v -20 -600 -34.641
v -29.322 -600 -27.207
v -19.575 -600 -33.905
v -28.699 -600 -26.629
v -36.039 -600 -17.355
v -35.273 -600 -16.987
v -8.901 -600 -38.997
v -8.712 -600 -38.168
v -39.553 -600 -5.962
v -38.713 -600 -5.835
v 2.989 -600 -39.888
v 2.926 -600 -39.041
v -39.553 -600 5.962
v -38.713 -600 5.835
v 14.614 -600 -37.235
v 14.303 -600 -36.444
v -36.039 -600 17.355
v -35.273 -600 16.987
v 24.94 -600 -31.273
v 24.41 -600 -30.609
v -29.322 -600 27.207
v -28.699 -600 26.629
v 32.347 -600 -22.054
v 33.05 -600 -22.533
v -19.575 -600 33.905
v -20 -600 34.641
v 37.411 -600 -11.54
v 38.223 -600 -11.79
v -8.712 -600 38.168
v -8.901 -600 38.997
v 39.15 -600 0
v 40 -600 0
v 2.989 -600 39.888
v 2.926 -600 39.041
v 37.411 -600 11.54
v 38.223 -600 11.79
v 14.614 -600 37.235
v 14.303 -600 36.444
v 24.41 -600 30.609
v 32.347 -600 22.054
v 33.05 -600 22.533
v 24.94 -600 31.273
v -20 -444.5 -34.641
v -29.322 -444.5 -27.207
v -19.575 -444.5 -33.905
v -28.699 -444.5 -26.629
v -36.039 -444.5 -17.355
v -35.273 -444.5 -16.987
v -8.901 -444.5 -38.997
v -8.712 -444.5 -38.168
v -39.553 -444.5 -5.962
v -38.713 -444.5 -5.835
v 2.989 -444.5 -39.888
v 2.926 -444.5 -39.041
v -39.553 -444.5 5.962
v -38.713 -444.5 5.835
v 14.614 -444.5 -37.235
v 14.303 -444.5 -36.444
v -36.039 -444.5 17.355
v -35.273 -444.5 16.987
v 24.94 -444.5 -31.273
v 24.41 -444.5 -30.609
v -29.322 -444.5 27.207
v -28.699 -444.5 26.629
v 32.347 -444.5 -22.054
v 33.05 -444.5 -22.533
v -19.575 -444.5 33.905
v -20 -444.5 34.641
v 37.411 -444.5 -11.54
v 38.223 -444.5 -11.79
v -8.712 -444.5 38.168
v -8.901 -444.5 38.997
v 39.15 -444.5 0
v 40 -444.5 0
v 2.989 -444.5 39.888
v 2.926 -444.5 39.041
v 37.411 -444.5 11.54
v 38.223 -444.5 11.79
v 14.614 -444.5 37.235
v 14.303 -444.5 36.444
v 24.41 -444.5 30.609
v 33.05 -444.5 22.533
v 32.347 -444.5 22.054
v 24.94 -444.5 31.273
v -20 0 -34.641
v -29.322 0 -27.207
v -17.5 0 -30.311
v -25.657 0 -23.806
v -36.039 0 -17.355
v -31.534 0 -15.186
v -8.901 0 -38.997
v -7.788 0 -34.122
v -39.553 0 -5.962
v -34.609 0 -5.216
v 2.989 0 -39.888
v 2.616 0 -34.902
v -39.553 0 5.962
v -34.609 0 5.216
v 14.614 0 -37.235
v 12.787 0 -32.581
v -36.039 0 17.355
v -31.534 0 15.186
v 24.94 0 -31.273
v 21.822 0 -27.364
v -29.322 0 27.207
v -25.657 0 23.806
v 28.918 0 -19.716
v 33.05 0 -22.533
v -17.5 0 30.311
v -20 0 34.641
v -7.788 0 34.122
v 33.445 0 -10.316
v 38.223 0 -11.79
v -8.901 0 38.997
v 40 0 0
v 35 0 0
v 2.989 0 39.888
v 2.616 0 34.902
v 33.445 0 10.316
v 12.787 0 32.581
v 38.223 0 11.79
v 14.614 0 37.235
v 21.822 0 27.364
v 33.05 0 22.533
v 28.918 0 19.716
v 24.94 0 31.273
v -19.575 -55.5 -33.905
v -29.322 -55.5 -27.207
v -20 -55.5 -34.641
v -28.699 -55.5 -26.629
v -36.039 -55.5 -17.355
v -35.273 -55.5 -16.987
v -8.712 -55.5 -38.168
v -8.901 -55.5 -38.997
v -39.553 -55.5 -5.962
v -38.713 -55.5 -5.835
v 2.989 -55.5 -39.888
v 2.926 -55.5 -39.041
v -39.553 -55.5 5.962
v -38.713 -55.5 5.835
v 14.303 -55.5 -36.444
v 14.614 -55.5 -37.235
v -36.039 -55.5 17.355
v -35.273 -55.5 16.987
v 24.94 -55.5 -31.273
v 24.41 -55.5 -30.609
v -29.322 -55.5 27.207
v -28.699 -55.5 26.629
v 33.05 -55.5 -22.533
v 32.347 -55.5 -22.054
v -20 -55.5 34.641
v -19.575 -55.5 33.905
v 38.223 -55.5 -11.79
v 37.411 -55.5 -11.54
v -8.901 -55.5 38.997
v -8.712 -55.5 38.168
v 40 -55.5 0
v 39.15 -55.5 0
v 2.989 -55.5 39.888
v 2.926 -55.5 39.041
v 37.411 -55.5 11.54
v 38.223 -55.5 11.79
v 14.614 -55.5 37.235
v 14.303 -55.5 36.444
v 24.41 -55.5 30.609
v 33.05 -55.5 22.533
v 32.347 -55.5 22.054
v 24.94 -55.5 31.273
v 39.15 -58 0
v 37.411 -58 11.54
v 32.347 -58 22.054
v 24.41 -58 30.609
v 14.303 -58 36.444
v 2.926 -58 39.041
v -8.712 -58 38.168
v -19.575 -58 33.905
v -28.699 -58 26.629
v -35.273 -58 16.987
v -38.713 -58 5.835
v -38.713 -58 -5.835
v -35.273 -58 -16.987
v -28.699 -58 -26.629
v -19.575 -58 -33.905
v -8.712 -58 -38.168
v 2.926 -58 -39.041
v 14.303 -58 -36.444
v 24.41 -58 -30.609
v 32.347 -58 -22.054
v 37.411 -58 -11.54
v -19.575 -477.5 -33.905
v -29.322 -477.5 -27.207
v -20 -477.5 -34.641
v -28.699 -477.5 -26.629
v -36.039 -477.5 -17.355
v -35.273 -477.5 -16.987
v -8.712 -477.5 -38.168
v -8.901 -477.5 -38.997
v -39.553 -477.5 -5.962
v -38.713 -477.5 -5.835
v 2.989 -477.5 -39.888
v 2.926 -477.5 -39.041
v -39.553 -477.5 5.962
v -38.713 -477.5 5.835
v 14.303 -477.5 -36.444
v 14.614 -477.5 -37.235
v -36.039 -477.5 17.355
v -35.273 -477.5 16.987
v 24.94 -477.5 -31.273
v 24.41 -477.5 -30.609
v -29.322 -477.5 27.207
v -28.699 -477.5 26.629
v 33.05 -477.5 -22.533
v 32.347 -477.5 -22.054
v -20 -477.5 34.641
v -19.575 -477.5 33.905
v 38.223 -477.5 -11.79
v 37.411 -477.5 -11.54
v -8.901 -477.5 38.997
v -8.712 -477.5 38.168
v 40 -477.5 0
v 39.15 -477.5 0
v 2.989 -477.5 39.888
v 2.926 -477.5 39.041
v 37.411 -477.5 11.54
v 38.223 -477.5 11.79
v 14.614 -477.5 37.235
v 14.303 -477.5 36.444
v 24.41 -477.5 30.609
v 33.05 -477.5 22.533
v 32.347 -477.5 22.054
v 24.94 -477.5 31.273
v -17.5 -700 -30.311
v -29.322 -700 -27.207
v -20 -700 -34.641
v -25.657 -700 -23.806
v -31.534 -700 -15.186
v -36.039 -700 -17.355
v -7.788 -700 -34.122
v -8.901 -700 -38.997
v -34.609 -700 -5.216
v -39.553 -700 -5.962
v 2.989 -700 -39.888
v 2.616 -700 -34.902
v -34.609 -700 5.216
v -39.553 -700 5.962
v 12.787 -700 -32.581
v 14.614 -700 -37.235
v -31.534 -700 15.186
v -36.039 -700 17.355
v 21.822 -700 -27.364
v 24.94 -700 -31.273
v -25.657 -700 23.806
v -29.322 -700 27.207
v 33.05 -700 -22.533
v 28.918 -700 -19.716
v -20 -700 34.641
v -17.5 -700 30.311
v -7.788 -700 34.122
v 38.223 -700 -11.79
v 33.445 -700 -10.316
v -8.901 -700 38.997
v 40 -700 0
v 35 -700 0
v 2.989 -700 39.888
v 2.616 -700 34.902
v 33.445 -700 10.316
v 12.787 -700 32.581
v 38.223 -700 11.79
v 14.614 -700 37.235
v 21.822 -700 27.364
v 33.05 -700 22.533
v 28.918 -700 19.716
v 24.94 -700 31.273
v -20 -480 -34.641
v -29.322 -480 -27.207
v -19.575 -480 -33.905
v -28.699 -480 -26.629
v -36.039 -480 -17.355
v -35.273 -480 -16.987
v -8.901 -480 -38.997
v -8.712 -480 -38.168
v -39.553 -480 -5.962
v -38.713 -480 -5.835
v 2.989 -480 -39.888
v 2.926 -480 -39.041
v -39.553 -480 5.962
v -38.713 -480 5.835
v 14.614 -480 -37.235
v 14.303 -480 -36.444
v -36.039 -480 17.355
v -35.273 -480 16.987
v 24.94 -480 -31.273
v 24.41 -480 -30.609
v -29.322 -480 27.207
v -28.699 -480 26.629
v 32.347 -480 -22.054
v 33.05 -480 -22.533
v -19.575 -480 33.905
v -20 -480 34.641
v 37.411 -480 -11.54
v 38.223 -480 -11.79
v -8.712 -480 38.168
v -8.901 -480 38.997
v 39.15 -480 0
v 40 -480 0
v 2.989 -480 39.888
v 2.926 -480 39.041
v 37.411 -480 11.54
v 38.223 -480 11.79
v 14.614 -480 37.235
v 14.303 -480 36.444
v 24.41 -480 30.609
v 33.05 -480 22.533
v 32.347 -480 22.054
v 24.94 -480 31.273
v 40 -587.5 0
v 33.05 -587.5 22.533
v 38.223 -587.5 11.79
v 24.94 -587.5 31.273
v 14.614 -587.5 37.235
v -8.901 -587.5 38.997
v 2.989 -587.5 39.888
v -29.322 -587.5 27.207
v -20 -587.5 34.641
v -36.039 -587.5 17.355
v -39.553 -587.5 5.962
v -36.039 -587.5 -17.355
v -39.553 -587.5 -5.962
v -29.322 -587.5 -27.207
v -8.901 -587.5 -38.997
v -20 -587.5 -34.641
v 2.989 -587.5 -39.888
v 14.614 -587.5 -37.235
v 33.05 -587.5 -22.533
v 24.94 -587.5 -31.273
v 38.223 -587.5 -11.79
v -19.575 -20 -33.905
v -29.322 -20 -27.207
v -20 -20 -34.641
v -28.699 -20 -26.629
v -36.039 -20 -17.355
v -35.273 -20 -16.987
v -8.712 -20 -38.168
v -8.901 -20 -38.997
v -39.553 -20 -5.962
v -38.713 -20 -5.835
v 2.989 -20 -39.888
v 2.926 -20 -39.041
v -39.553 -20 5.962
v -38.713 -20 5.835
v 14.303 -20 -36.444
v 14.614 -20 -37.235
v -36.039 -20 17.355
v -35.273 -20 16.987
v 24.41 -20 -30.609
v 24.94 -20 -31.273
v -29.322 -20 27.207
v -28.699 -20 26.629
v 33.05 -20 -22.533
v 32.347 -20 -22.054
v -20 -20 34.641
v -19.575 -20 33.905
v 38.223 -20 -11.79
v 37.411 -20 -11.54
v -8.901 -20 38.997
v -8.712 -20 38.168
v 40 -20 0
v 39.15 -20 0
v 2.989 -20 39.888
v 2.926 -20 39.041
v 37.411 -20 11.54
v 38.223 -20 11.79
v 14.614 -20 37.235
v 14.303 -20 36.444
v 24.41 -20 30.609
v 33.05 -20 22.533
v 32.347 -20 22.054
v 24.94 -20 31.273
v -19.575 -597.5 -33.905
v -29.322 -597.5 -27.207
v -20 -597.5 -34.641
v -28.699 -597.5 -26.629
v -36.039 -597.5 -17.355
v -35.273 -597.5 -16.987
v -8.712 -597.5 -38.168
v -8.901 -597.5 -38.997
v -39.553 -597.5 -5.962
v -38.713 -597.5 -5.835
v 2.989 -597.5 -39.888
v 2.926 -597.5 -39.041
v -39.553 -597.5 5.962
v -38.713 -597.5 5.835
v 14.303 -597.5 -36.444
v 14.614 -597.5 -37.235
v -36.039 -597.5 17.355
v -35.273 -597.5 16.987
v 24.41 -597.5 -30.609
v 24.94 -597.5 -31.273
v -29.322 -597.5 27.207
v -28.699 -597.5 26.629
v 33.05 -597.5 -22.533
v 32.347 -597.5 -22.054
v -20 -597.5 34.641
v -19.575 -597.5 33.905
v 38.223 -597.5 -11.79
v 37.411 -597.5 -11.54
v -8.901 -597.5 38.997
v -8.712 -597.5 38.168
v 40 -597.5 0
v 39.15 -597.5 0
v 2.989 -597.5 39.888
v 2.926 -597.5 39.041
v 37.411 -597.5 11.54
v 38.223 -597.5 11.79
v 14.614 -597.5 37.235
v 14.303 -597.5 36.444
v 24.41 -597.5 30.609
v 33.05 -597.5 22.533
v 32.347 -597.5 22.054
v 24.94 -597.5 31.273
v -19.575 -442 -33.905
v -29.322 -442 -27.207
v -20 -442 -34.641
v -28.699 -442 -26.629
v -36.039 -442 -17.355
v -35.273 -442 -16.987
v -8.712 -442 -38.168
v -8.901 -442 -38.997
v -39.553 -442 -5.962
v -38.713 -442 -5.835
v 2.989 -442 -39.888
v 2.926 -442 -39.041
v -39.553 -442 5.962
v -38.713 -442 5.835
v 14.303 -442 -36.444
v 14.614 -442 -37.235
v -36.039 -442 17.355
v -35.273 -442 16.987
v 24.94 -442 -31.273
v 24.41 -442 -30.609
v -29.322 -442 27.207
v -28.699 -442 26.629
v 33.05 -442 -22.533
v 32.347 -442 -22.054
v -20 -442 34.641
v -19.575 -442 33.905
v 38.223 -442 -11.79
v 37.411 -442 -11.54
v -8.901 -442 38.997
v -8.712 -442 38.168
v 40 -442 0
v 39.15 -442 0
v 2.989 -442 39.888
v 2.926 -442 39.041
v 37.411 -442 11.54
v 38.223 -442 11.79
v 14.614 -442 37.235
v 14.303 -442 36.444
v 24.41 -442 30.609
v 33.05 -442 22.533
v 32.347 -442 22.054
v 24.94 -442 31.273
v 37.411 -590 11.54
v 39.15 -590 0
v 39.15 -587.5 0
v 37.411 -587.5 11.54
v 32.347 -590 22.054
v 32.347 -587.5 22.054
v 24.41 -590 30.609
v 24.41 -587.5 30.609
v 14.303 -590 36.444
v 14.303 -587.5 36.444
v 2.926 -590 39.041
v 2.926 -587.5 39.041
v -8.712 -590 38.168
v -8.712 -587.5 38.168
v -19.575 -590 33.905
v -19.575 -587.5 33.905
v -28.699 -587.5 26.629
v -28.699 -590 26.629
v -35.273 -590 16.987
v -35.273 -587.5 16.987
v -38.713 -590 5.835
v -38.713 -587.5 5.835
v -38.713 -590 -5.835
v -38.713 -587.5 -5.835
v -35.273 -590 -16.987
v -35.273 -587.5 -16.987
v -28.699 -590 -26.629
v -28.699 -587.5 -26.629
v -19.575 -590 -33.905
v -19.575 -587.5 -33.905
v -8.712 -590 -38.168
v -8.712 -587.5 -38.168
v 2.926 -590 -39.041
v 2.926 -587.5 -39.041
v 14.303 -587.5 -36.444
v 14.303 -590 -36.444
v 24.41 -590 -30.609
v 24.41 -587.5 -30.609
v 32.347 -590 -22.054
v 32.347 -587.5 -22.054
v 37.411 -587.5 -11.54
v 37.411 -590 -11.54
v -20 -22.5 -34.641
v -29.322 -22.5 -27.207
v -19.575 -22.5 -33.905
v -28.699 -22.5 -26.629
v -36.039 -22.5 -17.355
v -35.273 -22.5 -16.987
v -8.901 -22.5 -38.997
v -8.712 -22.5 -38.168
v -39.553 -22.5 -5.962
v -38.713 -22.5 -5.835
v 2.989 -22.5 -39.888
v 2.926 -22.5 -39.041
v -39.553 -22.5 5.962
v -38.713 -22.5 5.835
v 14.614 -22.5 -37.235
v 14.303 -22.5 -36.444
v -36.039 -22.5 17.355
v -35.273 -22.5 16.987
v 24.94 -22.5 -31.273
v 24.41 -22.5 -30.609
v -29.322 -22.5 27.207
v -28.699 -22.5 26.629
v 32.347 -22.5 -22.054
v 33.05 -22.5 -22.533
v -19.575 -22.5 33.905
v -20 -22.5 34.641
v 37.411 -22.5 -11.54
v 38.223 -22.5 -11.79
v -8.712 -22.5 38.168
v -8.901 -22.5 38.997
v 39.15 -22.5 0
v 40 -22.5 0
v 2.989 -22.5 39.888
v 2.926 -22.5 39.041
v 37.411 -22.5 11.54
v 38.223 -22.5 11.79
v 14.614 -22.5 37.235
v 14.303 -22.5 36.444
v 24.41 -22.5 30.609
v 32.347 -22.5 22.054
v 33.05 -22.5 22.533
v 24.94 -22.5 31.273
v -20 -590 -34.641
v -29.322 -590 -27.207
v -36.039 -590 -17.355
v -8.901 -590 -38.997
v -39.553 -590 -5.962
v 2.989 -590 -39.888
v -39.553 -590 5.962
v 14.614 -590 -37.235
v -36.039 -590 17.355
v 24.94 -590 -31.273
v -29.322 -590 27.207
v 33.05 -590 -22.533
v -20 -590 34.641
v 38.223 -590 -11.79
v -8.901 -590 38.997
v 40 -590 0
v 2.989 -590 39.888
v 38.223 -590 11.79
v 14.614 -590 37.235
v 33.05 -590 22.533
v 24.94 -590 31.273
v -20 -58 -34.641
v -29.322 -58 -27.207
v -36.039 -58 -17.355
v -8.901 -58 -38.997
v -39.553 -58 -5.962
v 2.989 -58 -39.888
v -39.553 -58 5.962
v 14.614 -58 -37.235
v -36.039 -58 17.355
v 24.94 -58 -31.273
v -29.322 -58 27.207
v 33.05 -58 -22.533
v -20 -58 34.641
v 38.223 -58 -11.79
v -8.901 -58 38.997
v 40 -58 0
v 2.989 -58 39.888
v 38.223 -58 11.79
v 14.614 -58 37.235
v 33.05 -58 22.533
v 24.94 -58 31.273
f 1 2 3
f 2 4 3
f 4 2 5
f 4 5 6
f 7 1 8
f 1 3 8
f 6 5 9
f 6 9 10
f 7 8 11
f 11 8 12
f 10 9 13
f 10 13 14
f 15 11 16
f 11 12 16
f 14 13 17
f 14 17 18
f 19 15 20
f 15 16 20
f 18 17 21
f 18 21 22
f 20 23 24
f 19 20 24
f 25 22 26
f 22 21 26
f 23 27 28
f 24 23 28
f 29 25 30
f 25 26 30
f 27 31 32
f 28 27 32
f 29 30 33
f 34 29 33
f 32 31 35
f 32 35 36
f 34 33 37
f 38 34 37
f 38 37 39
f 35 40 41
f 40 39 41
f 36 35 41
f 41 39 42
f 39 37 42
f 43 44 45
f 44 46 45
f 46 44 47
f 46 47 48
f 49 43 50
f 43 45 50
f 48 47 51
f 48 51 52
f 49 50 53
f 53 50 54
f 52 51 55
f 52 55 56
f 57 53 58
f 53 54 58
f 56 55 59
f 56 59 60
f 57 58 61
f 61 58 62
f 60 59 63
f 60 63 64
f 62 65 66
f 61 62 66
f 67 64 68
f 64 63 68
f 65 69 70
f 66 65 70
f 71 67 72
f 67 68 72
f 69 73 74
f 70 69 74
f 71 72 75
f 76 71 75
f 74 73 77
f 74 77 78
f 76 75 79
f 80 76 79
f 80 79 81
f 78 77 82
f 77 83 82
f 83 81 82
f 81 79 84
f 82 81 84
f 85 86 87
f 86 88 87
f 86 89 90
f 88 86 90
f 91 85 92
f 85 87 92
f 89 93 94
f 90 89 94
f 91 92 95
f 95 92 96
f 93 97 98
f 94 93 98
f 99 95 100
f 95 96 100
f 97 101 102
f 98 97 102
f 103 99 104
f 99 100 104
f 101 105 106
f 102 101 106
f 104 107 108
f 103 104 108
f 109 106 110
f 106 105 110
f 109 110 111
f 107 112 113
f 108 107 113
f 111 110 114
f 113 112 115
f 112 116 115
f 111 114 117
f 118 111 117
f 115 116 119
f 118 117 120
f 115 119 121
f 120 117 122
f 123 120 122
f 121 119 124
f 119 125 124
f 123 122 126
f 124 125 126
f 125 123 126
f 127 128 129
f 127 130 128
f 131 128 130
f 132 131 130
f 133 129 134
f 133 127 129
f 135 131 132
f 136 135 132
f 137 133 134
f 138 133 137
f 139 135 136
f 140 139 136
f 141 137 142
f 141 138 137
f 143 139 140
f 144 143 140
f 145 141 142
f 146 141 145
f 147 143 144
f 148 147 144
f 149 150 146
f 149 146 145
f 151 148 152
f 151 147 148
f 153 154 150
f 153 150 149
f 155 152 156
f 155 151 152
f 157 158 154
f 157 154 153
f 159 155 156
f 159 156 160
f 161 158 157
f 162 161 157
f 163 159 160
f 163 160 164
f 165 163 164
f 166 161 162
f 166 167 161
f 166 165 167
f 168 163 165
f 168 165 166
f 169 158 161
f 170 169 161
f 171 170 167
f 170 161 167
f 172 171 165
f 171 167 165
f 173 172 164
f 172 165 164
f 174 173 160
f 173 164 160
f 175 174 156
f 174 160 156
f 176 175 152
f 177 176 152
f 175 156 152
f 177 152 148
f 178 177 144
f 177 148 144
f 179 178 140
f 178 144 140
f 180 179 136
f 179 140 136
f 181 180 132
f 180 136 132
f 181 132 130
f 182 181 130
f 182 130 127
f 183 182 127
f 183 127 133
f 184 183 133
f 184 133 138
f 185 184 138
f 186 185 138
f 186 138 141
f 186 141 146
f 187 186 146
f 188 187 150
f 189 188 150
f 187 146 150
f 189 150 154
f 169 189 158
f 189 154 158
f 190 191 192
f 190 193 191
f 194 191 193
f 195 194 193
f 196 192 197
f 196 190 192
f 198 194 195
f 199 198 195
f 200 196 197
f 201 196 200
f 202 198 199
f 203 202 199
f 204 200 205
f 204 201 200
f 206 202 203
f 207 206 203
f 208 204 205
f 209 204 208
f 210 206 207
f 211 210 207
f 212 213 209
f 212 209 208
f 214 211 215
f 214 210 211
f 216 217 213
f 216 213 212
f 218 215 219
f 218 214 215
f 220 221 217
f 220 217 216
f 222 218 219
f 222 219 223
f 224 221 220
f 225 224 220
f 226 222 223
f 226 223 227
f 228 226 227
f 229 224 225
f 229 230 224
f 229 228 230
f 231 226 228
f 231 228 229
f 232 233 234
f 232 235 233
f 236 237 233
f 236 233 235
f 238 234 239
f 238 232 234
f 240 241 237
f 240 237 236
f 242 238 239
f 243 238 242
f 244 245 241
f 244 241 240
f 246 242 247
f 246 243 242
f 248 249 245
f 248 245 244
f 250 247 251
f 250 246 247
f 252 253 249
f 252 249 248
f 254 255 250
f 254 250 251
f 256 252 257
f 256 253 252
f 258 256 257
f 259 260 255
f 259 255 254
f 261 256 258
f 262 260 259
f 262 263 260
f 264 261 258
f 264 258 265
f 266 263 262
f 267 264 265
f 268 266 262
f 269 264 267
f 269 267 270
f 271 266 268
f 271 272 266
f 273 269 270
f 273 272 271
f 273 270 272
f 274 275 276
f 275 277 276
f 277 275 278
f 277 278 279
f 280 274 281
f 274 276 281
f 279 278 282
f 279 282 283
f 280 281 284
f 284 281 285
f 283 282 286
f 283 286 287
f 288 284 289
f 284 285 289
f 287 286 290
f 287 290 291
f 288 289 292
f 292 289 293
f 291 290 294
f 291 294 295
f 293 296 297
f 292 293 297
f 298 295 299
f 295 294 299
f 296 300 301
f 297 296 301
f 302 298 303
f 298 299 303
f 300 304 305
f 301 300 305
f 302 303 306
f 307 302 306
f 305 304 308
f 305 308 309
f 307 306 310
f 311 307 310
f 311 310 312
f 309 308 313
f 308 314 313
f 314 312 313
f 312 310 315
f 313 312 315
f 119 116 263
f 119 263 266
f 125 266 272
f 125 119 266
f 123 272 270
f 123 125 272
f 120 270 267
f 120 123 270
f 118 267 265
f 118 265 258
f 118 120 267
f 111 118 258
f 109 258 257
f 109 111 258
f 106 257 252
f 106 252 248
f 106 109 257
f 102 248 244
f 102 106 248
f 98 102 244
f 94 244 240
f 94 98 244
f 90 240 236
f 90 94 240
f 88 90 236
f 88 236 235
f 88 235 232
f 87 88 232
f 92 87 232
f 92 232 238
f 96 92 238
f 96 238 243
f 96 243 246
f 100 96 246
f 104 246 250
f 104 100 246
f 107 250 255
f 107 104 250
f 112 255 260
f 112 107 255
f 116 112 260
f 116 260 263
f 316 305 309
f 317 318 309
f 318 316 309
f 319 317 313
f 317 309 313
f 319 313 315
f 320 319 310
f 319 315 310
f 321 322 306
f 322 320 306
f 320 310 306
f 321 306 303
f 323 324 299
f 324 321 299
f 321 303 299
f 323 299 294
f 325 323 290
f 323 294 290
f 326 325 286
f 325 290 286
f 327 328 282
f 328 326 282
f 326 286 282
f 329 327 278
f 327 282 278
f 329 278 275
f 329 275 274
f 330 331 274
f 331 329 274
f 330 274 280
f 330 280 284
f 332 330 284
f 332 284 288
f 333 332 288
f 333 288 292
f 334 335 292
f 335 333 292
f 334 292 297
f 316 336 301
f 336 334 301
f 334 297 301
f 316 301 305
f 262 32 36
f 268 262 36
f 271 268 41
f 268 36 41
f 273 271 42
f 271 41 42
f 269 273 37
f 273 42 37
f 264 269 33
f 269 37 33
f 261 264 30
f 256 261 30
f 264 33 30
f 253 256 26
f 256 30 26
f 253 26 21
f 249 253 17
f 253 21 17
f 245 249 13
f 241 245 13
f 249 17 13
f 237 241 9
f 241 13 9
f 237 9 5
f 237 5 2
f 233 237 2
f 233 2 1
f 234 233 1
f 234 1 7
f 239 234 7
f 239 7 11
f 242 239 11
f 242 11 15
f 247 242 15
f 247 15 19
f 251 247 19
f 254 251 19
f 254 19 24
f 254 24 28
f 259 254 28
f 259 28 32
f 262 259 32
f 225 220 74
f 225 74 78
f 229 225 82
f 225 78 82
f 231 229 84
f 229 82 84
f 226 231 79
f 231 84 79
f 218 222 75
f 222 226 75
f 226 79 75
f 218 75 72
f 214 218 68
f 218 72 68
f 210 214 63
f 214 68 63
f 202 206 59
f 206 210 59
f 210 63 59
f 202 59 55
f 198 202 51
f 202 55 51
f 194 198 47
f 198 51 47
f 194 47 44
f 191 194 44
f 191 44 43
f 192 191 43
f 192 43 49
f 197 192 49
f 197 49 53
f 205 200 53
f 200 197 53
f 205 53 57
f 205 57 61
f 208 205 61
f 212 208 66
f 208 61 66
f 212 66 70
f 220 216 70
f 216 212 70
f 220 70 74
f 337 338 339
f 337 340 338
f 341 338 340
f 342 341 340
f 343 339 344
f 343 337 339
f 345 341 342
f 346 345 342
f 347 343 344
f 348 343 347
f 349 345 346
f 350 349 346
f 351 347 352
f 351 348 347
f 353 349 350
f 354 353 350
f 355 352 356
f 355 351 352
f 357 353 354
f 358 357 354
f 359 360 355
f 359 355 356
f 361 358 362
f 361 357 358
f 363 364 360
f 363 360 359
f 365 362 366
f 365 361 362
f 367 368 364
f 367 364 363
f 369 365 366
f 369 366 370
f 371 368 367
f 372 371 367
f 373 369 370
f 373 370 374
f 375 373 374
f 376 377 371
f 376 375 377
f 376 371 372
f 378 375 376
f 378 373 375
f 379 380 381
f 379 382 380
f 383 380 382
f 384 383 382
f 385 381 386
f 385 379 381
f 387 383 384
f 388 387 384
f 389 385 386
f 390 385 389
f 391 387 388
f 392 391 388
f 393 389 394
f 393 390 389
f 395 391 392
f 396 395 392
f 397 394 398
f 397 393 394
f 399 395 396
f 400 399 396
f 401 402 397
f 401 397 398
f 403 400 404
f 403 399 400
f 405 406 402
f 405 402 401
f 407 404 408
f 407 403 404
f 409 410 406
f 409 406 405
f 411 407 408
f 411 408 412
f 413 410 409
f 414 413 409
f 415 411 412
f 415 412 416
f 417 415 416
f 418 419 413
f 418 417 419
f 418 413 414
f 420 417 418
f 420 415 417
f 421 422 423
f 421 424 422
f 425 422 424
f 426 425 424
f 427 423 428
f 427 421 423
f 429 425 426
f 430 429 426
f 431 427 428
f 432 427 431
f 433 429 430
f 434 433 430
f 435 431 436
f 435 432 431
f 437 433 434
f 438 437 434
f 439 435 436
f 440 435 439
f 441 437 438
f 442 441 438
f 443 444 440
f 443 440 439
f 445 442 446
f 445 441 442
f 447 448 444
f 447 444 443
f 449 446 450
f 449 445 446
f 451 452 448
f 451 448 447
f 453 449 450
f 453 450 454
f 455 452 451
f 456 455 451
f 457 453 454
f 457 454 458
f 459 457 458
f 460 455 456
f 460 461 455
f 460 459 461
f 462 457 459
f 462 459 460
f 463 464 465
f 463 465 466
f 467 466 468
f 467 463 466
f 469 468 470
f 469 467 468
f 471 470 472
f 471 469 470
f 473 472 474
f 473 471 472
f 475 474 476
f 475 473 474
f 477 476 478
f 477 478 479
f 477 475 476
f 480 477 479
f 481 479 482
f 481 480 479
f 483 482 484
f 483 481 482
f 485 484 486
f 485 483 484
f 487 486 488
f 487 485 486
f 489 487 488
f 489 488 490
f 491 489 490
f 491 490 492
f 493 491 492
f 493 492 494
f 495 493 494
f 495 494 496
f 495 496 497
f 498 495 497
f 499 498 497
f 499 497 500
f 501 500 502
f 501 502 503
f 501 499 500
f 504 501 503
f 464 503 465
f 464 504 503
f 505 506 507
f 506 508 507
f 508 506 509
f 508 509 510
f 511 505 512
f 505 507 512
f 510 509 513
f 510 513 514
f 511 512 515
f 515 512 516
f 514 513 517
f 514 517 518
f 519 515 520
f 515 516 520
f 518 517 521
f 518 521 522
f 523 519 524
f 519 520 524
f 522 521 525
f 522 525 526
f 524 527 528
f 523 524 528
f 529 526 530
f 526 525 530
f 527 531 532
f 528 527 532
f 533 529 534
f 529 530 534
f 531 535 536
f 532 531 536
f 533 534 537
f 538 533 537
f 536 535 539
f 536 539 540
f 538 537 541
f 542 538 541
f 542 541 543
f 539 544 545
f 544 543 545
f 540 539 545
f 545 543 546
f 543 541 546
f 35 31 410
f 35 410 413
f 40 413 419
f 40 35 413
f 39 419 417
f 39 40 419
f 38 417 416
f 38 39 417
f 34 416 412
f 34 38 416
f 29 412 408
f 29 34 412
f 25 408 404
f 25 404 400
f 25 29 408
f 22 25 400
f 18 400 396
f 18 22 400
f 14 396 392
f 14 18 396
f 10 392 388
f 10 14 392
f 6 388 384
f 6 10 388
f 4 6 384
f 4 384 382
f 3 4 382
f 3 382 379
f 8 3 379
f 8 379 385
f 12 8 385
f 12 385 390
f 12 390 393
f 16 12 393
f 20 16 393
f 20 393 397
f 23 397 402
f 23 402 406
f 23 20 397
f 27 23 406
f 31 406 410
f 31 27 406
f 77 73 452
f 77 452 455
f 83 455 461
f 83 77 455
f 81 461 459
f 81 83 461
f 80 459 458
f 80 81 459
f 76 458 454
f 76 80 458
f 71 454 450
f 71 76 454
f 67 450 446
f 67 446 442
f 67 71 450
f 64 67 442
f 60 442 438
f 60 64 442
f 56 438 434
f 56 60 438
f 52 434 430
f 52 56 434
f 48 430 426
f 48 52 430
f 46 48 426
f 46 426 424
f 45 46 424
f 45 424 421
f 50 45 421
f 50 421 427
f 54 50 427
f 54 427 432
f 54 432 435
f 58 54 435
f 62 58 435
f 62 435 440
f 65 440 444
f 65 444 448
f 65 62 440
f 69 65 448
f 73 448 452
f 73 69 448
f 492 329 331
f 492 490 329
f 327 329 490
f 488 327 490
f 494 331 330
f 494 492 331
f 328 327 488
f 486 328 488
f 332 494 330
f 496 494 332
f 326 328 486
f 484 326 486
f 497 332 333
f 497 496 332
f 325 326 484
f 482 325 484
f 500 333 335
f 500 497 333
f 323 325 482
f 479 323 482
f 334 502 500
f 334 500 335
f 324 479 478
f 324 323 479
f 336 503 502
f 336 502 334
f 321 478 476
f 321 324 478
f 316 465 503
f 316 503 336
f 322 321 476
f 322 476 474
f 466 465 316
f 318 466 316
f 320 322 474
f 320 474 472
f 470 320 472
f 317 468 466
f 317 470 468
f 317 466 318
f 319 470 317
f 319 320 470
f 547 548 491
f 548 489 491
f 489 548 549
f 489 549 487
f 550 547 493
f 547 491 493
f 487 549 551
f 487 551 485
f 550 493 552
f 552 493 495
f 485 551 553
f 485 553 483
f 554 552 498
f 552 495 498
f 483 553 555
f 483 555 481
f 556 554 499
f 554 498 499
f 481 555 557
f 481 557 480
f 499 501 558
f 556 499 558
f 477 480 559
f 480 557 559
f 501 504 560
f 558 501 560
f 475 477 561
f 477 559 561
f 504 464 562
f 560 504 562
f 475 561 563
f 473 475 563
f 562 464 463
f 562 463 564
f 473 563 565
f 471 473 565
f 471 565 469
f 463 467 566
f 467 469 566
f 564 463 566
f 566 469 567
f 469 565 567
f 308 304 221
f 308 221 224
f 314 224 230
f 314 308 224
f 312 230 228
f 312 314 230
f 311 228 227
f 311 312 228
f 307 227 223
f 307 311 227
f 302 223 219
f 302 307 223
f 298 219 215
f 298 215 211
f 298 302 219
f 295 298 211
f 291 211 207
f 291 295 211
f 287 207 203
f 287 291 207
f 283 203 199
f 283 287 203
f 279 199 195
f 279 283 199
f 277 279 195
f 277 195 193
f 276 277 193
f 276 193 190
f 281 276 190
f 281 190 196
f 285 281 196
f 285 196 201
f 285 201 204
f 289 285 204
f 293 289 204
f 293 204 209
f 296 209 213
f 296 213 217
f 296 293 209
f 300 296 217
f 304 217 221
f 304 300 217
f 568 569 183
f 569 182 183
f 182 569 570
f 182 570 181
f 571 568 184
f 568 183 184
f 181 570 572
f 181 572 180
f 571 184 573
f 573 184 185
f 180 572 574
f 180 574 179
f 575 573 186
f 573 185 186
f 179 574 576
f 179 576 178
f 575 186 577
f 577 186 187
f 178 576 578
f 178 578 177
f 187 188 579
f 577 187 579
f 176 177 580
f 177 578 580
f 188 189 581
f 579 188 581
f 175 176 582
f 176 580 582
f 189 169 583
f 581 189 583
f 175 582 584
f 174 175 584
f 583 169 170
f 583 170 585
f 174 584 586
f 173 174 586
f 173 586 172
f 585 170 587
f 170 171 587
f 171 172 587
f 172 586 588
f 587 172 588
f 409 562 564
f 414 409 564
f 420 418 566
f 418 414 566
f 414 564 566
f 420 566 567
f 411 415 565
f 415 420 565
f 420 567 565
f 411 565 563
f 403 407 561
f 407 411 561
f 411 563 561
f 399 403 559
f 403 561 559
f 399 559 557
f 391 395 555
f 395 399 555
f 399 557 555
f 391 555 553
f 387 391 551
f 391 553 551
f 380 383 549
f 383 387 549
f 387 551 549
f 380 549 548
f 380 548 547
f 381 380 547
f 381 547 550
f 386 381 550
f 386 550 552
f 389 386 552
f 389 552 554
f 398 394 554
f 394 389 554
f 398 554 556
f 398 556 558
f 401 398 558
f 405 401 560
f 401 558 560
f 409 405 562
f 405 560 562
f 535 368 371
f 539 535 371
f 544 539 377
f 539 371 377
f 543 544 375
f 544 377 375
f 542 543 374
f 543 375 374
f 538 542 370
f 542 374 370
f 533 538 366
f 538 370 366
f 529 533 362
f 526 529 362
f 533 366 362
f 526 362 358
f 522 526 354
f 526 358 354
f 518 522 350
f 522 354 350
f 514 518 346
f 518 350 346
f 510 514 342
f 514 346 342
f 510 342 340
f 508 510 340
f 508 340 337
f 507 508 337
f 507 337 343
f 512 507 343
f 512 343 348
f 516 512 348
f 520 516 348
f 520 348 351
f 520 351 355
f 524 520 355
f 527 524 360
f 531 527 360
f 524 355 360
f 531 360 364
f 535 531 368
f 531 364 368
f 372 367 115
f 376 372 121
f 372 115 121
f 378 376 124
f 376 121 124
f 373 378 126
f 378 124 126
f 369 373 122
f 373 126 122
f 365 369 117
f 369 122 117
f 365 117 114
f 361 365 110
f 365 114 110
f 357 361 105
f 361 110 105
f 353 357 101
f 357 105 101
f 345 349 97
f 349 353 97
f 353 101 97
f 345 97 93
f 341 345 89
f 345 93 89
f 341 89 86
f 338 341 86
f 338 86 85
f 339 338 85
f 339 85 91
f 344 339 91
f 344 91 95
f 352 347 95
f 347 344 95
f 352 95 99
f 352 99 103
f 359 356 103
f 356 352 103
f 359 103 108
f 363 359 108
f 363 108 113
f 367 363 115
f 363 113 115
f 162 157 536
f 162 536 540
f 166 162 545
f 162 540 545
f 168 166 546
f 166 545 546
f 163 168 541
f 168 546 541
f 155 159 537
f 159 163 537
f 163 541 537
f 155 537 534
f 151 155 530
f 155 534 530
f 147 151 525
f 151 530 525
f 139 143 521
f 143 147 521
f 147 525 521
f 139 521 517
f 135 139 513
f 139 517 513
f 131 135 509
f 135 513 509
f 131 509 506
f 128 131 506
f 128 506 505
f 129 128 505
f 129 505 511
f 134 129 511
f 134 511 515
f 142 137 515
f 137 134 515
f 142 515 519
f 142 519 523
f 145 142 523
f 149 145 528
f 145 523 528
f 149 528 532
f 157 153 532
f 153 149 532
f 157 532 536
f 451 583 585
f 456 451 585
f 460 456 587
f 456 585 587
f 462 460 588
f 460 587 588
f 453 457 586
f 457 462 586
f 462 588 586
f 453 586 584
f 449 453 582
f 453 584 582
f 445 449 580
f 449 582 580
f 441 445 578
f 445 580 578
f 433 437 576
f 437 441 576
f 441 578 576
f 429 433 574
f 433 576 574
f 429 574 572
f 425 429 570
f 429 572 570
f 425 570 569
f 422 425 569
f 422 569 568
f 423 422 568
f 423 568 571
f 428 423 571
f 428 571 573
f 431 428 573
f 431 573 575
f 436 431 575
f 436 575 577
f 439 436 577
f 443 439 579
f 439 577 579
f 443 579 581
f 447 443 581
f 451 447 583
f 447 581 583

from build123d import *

# Parameters (mm, degrees)
F0_R      = 40
F0_R_2    = 35
F1_DEPTH  = 700
F3_R      = 44
F3_R_2    = 39.15
F4_DEPTH  = 2.5
F6_R      = 42.5
F6_R_2    = 39.15
F7_DEPTH  = 2.5
F10_R     = 42.5
F10_R_2   = 39.15
F11_DEPTH = 2.5
F13_R     = 42.5
F13_R_2   = 39.15
F14_DEPTH = 2.5
F16_R     = 44
F16_R_2   = 39.15
F17_DEPTH = 2.5
F19_R     = 44
F19_R_2   = 39.15
F20_DEPTH = 2.5


with BuildPart() as f1:
    # F0 (on Front) → F1 (new body)
    with BuildSketch(Plane.XZ):
        Circle(F0_R)
        Circle(F0_R_2, mode=Mode.SUBTRACT)
    extrude(amount=F1_DEPTH)

    # F3 (on offset) → F4 (cut)
    with BuildSketch(Plane.XZ.offset(20)):
        Circle(F3_R)
        Circle(F3_R_2, mode=Mode.SUBTRACT)
    extrude(amount=F4_DEPTH, mode=Mode.SUBTRACT)

    # F6 (on offset) → F7 (cut)
    with BuildSketch(Plane.XZ.offset(55.5)):
        Circle(F6_R)
        Circle(F6_R_2, mode=Mode.SUBTRACT)
    extrude(amount=F7_DEPTH, mode=Mode.SUBTRACT)

    # F10 (on offset) → F11 (cut)
    with BuildSketch(Plane.XZ.offset(480)):
        Circle(F10_R)
        Circle(F10_R_2, mode=Mode.SUBTRACT)
    extrude(amount=-F11_DEPTH, mode=Mode.SUBTRACT)

    # F13 (on offset) → F14 (cut)
    with BuildSketch(Plane.XZ.offset(444.5)):
        Circle(F13_R)
        Circle(F13_R_2, mode=Mode.SUBTRACT)
    extrude(amount=-F14_DEPTH, mode=Mode.SUBTRACT)

    # F16 (on offset) → F17 (cut)
    with BuildSketch(Plane.XZ.offset(590)):
        Circle(F16_R)
        Circle(F16_R_2, mode=Mode.SUBTRACT)
    extrude(amount=-F17_DEPTH, mode=Mode.SUBTRACT)

    # F19 (on offset) → F20 (cut)
    with BuildSketch(Plane.XZ.offset(600)):
        Circle(F19_R)
        Circle(F19_R_2, mode=Mode.SUBTRACT)
    extrude(amount=-F20_DEPTH, mode=Mode.SUBTRACT)


solid = f1.part
